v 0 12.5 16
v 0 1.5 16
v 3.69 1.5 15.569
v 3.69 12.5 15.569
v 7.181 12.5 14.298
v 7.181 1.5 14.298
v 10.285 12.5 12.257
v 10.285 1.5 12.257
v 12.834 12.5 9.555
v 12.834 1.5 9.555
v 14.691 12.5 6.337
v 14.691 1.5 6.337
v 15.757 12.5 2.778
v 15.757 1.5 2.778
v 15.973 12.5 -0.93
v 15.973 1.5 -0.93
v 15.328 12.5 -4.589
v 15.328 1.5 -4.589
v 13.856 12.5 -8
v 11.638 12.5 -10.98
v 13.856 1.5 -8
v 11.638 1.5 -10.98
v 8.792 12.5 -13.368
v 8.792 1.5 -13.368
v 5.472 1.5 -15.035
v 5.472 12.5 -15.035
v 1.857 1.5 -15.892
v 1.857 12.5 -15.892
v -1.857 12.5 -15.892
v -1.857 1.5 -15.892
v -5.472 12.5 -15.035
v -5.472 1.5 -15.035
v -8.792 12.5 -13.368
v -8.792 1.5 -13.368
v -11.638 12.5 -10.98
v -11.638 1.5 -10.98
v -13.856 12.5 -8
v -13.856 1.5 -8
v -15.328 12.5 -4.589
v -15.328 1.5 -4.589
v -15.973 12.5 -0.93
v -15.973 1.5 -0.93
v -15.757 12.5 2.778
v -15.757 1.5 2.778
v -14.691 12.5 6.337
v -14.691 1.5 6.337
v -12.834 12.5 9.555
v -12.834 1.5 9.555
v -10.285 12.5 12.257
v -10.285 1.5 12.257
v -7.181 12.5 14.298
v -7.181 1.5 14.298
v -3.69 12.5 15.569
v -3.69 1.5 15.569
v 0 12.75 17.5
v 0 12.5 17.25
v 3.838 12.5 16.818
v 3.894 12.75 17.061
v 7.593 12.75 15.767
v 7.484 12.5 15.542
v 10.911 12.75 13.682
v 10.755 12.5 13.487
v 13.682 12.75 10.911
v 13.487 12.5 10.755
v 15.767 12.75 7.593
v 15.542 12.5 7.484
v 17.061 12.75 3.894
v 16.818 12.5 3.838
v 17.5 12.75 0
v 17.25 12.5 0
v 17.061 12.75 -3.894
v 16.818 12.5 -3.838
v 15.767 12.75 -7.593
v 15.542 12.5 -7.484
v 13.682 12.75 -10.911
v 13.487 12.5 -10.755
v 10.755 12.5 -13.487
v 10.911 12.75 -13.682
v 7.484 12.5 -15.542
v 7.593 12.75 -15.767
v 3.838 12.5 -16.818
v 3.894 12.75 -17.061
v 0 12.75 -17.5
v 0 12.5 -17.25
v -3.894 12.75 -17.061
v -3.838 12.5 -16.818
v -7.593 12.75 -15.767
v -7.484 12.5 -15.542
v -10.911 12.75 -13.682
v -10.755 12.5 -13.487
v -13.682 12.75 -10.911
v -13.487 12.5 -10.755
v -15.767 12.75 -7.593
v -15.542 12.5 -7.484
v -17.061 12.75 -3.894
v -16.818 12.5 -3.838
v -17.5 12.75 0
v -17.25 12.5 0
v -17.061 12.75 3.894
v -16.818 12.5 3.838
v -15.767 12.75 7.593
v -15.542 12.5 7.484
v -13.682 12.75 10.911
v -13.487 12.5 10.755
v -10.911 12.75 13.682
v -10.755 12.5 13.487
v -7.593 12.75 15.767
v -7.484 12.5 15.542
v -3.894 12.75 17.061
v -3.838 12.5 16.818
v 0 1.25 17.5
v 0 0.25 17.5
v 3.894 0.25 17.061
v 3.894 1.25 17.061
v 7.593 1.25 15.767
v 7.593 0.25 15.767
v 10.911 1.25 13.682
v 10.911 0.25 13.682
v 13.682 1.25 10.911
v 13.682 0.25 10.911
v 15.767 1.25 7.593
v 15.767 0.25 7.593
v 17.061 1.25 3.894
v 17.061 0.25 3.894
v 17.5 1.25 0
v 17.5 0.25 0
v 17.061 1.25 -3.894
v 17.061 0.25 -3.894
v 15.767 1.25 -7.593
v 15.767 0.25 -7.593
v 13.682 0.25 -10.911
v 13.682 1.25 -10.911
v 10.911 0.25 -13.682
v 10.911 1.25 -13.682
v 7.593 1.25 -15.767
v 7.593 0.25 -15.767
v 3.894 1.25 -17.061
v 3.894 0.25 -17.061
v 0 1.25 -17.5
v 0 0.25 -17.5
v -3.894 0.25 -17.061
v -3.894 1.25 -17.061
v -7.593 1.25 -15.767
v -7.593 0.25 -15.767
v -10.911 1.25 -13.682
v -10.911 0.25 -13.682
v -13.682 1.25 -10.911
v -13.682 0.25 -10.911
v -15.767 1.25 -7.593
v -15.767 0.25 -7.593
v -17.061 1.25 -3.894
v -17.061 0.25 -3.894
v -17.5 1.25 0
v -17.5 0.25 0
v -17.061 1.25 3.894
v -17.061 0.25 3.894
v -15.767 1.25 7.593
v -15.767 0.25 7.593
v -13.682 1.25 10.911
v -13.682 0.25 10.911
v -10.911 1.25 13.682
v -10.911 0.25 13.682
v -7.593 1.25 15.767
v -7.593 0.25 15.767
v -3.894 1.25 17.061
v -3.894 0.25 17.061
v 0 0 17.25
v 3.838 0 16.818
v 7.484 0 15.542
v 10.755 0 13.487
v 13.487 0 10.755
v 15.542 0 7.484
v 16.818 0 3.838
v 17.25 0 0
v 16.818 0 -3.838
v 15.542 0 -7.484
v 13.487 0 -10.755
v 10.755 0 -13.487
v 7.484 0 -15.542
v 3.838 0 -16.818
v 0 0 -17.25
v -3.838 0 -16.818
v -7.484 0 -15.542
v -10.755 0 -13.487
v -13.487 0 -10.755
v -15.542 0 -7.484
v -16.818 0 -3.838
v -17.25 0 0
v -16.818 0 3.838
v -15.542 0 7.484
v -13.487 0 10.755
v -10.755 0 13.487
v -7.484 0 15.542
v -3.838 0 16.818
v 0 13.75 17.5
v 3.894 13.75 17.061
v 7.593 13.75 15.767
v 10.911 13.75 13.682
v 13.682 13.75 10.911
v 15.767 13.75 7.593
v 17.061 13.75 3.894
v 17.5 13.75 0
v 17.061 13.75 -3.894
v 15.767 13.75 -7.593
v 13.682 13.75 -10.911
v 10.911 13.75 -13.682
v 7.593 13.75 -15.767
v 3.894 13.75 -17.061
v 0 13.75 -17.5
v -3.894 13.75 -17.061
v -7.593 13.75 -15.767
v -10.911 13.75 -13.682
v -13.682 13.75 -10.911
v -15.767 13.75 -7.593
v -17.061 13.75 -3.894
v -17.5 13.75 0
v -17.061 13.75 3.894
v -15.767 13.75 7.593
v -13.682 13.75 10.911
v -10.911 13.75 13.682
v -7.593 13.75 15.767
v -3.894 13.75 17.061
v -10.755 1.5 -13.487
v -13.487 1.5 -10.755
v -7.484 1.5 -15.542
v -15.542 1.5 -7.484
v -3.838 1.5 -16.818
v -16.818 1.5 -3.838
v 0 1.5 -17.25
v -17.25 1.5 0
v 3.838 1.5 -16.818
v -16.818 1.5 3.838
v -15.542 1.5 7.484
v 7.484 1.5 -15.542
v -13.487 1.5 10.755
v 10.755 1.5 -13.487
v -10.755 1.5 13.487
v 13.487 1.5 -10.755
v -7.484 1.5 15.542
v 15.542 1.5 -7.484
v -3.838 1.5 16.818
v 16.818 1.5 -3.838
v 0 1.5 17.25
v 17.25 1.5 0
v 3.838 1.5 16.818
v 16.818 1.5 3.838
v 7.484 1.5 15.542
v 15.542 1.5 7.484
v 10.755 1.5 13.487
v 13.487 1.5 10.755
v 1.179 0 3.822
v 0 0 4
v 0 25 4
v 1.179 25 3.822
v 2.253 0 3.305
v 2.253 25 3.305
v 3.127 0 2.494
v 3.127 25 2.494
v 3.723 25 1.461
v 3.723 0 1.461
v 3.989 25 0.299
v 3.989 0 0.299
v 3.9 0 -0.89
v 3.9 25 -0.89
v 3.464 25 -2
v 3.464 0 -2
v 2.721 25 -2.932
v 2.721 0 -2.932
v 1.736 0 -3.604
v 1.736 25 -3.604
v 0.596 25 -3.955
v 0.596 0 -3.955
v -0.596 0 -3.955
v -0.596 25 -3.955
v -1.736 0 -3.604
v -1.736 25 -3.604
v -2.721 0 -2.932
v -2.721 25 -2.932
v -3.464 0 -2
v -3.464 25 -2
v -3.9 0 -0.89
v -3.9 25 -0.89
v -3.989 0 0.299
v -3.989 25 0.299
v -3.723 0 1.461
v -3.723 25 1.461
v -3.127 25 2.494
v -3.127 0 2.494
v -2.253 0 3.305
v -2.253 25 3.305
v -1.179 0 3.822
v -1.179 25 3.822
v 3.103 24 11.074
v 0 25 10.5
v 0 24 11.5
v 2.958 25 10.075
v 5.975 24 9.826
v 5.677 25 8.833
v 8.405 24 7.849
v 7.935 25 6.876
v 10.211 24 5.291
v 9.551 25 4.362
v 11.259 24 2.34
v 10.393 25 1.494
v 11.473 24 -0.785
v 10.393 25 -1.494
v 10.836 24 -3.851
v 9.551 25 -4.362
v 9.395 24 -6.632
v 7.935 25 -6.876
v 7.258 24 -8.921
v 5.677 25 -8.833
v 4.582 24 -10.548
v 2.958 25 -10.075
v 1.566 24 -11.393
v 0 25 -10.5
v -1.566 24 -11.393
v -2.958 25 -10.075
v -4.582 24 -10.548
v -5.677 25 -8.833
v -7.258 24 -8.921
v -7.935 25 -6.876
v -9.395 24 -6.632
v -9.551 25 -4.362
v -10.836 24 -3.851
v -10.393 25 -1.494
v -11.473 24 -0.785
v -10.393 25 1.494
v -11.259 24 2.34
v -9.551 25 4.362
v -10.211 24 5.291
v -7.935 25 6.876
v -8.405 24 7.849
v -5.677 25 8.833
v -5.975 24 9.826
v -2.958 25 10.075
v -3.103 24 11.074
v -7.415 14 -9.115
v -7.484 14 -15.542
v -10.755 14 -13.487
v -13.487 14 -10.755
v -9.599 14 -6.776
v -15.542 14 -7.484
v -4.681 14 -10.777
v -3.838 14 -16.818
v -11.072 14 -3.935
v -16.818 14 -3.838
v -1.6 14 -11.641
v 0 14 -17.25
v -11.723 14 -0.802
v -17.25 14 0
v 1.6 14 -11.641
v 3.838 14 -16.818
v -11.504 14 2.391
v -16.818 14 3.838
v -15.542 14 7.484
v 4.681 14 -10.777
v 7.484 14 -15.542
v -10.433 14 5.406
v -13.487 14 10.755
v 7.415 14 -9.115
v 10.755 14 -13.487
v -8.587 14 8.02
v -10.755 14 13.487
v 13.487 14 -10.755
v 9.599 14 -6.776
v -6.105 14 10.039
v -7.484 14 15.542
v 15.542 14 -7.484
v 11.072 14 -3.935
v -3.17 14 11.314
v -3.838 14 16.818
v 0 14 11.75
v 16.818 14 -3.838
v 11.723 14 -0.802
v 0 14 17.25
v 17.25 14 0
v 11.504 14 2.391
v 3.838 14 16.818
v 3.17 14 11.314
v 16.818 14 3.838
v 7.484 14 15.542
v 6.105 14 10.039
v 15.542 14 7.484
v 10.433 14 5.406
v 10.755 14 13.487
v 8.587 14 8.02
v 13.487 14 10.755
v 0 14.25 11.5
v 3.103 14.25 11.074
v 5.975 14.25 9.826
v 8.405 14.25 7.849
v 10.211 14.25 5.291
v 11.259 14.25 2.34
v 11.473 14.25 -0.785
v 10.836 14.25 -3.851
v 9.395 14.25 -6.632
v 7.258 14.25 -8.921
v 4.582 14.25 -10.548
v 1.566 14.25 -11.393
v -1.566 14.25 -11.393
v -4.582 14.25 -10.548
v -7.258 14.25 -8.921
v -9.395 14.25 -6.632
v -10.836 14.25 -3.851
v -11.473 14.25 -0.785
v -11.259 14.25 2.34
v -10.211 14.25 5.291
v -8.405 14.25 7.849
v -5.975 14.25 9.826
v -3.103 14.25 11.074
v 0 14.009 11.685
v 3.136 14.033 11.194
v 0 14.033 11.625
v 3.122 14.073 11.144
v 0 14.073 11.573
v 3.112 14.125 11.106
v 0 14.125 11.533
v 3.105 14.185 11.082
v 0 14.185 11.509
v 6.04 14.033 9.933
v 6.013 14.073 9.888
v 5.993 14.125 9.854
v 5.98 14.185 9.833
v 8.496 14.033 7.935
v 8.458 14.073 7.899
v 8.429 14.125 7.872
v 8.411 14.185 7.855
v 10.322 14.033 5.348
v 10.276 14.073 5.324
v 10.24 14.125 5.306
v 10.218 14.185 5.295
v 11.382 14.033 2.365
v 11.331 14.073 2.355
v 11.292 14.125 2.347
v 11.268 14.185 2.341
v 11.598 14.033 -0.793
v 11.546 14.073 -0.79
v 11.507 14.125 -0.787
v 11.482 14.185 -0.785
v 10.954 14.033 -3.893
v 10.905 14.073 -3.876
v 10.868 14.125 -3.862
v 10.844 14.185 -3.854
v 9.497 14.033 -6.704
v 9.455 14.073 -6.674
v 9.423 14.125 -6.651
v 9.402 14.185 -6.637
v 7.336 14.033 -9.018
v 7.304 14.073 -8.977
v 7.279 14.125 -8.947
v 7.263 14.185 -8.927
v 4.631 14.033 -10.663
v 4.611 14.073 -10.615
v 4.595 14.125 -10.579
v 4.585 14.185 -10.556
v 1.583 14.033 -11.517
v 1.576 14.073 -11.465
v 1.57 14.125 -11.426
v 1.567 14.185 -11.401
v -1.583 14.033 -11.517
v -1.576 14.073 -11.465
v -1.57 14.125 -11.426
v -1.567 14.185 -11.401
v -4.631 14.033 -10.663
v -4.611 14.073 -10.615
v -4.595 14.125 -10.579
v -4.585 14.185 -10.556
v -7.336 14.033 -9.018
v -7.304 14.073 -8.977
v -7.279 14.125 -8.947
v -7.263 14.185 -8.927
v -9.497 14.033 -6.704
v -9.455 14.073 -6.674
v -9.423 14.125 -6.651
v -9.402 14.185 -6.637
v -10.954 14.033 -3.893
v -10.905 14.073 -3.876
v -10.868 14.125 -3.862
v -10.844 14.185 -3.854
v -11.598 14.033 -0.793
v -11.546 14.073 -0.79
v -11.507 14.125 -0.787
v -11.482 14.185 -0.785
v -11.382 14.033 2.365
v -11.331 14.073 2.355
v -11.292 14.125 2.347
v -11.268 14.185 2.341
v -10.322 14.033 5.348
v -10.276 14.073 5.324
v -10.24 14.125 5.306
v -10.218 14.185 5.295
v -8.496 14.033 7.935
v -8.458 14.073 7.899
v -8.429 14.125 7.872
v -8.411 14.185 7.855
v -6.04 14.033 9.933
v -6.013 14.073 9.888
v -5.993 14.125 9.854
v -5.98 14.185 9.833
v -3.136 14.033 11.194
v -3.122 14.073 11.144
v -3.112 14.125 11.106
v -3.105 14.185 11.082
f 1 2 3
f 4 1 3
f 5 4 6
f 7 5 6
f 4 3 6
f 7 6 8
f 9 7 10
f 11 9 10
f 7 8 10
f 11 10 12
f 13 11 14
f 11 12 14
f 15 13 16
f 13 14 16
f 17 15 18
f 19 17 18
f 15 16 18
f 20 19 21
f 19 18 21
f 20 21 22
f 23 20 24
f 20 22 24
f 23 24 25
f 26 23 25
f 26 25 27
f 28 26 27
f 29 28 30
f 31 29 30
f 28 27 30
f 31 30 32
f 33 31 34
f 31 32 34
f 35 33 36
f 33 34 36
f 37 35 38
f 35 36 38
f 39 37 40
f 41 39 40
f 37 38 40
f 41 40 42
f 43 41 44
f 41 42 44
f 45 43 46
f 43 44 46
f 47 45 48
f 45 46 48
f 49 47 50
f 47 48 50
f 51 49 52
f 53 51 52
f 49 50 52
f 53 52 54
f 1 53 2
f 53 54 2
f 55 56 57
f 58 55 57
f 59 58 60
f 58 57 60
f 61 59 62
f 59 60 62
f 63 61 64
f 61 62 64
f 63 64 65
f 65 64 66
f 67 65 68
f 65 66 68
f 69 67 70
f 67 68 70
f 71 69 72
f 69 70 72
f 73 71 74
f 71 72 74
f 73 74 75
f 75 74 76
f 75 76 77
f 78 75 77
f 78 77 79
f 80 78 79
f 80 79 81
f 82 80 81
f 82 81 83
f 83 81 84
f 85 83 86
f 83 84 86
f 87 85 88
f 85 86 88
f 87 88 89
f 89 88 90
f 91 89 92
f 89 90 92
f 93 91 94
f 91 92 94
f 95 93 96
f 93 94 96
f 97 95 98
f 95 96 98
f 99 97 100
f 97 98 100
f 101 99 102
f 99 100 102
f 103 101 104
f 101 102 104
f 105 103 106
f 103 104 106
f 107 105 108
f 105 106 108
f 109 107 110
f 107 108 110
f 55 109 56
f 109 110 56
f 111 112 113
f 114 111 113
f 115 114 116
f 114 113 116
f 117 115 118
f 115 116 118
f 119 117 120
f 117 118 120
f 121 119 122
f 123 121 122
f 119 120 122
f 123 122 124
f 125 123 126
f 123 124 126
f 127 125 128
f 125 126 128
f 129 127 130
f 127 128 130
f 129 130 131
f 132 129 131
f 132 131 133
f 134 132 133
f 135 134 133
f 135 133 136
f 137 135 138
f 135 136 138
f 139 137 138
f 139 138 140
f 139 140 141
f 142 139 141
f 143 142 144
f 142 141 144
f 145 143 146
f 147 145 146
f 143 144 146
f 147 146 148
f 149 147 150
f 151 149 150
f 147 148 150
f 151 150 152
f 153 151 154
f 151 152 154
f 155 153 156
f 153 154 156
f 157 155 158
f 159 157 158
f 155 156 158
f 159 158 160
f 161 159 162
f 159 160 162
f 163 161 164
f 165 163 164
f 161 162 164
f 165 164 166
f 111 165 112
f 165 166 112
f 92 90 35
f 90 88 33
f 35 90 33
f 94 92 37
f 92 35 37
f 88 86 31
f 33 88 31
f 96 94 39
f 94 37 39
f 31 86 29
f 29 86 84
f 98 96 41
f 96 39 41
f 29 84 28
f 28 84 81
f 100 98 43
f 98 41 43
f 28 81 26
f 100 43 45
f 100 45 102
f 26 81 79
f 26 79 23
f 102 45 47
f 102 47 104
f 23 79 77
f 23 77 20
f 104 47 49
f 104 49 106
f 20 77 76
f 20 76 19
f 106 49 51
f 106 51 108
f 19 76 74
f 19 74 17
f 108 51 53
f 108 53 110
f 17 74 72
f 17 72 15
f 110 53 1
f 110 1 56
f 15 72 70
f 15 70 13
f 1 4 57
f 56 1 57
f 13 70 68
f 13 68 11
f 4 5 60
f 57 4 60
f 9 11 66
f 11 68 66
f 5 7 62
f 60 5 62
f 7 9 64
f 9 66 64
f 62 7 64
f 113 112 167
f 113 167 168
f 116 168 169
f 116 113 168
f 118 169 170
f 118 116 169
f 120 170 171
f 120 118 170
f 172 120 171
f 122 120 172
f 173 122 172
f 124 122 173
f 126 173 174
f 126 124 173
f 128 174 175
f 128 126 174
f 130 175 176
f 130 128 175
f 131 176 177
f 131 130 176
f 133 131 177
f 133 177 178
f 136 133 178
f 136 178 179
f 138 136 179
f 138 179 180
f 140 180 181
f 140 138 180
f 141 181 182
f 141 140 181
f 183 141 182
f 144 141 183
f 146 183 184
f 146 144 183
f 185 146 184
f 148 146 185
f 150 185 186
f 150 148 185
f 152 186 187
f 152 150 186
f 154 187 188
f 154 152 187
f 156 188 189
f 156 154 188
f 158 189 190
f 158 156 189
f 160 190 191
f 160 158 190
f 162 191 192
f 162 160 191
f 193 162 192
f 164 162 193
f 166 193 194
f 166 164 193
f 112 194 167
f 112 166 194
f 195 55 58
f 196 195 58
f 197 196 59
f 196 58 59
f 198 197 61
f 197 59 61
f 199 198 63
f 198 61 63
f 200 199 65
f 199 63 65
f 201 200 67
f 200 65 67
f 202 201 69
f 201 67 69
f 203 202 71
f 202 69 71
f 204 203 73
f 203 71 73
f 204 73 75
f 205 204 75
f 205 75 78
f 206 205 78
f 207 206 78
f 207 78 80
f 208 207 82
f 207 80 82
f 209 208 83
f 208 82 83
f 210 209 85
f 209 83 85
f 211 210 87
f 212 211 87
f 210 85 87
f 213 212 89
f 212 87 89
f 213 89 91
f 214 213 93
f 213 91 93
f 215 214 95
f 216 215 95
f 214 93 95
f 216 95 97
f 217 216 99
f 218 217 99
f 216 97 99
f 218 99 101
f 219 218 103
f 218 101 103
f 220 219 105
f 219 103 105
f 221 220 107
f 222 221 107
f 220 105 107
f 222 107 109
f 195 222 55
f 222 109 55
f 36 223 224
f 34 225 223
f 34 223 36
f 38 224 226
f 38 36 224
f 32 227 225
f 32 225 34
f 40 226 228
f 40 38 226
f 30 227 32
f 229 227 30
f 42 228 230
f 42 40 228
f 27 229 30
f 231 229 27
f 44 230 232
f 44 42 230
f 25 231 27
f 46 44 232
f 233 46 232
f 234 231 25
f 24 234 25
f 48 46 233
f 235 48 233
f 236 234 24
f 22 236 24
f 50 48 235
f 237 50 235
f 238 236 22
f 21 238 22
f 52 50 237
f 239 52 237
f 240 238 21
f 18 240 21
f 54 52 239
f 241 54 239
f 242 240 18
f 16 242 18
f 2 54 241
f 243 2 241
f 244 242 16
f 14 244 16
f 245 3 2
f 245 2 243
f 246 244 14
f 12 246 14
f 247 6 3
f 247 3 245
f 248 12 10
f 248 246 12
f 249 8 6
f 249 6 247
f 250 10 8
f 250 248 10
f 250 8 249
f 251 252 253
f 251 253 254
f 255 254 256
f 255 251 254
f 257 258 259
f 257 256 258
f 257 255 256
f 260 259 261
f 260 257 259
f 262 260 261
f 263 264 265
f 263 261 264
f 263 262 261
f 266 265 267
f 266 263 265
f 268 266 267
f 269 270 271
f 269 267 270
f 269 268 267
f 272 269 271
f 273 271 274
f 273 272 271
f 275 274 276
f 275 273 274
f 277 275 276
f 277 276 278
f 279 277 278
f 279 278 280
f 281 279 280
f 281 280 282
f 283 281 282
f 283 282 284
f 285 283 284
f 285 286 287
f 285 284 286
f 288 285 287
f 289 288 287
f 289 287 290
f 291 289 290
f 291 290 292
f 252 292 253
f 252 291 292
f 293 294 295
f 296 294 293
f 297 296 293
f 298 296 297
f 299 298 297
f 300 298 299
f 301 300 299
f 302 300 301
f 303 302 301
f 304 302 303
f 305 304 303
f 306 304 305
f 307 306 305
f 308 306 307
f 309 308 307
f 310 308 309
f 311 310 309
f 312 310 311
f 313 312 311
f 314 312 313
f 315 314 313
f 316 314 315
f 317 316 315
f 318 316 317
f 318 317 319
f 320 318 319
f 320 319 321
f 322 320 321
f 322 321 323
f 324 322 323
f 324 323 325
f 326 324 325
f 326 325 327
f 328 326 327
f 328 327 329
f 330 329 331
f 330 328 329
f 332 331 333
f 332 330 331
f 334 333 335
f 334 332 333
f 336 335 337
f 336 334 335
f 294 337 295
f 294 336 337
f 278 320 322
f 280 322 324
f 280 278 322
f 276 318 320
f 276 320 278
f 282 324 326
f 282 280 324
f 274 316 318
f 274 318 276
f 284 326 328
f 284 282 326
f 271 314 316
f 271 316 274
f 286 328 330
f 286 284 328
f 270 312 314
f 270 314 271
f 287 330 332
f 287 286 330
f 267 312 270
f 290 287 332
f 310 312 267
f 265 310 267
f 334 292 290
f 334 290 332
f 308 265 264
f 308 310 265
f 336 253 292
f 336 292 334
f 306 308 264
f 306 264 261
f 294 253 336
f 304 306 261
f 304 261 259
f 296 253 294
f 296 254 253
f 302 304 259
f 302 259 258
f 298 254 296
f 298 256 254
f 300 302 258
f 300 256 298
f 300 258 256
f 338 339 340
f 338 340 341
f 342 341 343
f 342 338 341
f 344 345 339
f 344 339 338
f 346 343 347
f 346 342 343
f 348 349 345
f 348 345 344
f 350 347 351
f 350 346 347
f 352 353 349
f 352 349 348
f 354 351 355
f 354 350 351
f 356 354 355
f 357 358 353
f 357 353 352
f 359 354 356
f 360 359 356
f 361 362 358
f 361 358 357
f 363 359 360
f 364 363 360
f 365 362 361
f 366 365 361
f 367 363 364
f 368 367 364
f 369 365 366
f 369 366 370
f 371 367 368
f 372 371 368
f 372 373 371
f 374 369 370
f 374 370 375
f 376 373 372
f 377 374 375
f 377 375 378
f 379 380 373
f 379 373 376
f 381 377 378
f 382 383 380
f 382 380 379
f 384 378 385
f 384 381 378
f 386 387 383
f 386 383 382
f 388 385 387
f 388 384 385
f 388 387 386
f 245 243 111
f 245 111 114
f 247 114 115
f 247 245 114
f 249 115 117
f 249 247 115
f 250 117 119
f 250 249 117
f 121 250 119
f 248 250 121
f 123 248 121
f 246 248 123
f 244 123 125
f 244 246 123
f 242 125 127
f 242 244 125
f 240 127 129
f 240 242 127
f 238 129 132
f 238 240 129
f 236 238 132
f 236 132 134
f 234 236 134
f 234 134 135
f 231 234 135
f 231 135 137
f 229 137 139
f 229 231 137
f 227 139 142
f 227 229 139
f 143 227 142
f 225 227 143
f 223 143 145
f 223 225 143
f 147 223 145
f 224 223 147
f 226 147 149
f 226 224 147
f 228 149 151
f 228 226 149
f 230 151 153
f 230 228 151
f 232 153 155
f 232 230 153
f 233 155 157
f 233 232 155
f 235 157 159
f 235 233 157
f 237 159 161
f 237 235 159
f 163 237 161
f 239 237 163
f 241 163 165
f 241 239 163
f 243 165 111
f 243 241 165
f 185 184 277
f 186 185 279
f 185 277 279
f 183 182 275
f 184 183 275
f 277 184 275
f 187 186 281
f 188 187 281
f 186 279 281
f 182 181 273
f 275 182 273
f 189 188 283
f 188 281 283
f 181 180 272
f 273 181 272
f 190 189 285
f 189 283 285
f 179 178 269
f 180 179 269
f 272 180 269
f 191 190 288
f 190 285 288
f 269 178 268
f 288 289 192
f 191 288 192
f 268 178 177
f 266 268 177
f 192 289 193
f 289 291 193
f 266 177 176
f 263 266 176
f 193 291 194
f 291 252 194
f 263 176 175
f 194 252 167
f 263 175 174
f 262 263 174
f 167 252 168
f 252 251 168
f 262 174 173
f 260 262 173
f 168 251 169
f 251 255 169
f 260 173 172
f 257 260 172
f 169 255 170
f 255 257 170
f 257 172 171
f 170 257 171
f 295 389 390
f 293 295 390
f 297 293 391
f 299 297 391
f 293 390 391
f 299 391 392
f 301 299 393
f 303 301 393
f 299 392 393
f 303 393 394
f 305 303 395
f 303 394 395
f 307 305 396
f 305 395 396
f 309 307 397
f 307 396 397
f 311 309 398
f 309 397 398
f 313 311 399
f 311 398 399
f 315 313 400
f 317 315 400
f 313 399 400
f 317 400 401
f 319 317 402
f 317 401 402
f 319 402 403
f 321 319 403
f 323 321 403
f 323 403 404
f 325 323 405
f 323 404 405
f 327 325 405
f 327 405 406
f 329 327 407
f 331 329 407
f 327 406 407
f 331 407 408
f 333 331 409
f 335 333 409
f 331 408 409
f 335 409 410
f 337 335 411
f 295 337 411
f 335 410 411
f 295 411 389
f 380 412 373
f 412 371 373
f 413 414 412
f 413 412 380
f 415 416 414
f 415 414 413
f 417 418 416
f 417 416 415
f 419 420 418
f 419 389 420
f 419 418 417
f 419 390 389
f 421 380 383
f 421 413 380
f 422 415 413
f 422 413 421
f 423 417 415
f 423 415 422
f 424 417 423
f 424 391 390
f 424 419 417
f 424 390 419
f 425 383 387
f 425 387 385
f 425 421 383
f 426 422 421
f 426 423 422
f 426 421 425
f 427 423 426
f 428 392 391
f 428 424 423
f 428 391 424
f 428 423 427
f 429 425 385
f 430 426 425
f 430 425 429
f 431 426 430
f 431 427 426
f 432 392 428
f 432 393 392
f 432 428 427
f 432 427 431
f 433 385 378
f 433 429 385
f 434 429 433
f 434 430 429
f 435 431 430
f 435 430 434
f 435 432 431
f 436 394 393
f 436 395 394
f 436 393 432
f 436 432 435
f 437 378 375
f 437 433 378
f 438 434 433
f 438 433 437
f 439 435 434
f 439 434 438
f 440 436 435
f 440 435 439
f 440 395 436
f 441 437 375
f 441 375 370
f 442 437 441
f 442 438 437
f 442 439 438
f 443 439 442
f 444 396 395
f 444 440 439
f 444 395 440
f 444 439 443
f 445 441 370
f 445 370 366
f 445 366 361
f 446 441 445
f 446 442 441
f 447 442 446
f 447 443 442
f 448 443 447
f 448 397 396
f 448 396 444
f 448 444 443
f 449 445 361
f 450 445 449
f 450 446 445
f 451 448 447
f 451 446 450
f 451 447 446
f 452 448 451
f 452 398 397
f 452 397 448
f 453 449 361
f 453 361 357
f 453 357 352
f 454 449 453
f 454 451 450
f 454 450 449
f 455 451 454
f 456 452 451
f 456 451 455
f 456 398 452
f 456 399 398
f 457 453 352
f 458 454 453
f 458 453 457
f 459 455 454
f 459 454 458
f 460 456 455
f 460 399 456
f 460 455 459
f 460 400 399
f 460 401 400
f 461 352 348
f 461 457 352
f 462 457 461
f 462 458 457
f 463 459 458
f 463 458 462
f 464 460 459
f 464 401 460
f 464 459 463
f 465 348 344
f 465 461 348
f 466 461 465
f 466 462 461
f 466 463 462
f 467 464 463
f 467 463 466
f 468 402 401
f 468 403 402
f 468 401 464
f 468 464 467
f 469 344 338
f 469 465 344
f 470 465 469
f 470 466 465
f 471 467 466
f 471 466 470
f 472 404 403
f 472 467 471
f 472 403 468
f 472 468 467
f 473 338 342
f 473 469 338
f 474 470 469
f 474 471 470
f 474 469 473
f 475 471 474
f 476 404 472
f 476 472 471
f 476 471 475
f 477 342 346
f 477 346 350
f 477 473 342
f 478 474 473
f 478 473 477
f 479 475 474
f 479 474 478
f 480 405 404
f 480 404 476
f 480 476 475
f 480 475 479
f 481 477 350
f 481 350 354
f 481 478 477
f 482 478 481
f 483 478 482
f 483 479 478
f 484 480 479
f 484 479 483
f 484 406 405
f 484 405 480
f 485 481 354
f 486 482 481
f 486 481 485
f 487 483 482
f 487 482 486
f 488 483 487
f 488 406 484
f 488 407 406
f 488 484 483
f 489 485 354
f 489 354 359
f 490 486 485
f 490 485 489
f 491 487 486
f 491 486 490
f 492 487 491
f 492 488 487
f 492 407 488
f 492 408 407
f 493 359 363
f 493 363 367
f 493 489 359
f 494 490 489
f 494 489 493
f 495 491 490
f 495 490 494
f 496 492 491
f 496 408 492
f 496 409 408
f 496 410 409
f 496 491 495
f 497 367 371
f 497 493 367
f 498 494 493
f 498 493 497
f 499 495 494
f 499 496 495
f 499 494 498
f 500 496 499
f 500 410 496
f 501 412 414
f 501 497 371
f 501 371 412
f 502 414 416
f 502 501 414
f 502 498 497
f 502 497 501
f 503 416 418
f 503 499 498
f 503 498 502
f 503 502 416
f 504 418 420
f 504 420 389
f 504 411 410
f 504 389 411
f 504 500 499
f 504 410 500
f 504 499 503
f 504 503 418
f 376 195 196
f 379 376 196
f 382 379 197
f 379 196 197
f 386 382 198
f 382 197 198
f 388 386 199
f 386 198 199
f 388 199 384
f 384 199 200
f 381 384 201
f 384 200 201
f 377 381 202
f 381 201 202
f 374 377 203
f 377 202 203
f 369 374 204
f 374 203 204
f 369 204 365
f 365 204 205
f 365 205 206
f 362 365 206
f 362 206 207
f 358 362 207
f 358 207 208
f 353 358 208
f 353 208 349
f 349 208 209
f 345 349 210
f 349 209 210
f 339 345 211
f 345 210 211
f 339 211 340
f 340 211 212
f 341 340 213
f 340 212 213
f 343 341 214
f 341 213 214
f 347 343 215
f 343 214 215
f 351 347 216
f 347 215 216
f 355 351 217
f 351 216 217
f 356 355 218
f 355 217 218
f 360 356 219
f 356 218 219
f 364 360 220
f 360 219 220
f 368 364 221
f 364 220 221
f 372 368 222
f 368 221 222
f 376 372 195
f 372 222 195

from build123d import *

# Parameters (mm, degrees)
SKETCH1_R               = 17.5
BOSS_EXTRUDE1_DEPTH     = 1.5
SKETCH2_R               = 16
BOSS_EXTRUDE2_DEPTH     = 11
SKETCH3_R               = 17.5
BOSS_EXTRUDE3_DEPTH     = 1.5
SKETCH4_R               = 11.5
BOSS_EXTRUDE4_DEPTH     = 11
CUT_EXTRUDE1_DEPTH      = 36.178118199
CUT_EXTRUDE1_DEPTH_BACK = 36.178118199
SKETCH6_R               = 4
CHAMFER1_SIZE           = 1
CHAMFER2_SIZE           = 0.25
FILLET1_R               = 0.25


with BuildPart() as part:
    # Sketch1 → Boss-Extrude1 (new body)
    with BuildSketch(Plane(origin=(0, 0, 0), x_dir=(1, 0, 0), z_dir=(0, 1, 0))):
        with Locations(Location((0, 0, 0), (0, 0, 270))):
            Circle(SKETCH1_R)
    extrude(amount=BOSS_EXTRUDE1_DEPTH)

    # Sketch2 → Boss-Extrude2 (add)
    with BuildSketch(Plane(origin=(0, 1.5, 0), x_dir=(1, 0, 0), z_dir=(0, 1, 0))):
        with Locations(Location((0, 0, 0), (0, 0, 270))):
            Circle(SKETCH2_R)
    extrude(amount=BOSS_EXTRUDE2_DEPTH)

    # Sketch3 → Boss-Extrude3 (add)
    with BuildSketch(Plane(origin=(0, 12.5, 0), x_dir=(1, 0, 0), z_dir=(0, 1, 0))):
        with Locations(Location((0, 0, 0), (0, 0, 270))):
            Circle(SKETCH3_R)
    extrude(amount=BOSS_EXTRUDE3_DEPTH)

    # Sketch4 → Boss-Extrude4 (add)
    with BuildSketch(Plane(origin=(0, 14, 0), x_dir=(1, 0, 0), z_dir=(0, 1, 0))):
        with Locations(Location((0, 0, 0), (0, 0, 270))):
            Circle(SKETCH4_R)
    extrude(amount=BOSS_EXTRUDE4_DEPTH)

    # Sketch6 → Cut-Extrude1 (cut, two sides: drawn at the far end of the back side and taken through both)
    with BuildSketch(Plane(origin=(0, 25, 0), x_dir=(1, 0, 0), z_dir=(0, 1, 0)).offset(-CUT_EXTRUDE1_DEPTH_BACK)):
        with Locations(Location((0, 0, 0), (0, 0, 270))):
            Circle(SKETCH6_R)
    extrude(amount=CUT_EXTRUDE1_DEPTH + CUT_EXTRUDE1_DEPTH_BACK, mode=Mode.SUBTRACT)

    # Chamfer1
    chamfer1_edges = [part.edges().sort_by_distance(p)[0] for p in [
        (0, 25, -11.5),
    ]]
    chamfer(chamfer1_edges, length=CHAMFER1_SIZE)

    # Chamfer2
    chamfer2_edges = [part.edges().sort_by_distance(p)[0] for p in [
        (0, 0, -17.5),
        (0, 1.5, -17.5),
        (0, 12.5, -17.5),
        (0, 14, -17.5),
    ]]
    chamfer(chamfer2_edges, length=CHAMFER2_SIZE)

    # Fillet1
    fillet1_edges = [part.edges().sort_by_distance(p)[0] for p in [
        (0, 14, -11.5),
    ]]
    fillet(fillet1_edges, radius=FILLET1_R)


solid = part.part
